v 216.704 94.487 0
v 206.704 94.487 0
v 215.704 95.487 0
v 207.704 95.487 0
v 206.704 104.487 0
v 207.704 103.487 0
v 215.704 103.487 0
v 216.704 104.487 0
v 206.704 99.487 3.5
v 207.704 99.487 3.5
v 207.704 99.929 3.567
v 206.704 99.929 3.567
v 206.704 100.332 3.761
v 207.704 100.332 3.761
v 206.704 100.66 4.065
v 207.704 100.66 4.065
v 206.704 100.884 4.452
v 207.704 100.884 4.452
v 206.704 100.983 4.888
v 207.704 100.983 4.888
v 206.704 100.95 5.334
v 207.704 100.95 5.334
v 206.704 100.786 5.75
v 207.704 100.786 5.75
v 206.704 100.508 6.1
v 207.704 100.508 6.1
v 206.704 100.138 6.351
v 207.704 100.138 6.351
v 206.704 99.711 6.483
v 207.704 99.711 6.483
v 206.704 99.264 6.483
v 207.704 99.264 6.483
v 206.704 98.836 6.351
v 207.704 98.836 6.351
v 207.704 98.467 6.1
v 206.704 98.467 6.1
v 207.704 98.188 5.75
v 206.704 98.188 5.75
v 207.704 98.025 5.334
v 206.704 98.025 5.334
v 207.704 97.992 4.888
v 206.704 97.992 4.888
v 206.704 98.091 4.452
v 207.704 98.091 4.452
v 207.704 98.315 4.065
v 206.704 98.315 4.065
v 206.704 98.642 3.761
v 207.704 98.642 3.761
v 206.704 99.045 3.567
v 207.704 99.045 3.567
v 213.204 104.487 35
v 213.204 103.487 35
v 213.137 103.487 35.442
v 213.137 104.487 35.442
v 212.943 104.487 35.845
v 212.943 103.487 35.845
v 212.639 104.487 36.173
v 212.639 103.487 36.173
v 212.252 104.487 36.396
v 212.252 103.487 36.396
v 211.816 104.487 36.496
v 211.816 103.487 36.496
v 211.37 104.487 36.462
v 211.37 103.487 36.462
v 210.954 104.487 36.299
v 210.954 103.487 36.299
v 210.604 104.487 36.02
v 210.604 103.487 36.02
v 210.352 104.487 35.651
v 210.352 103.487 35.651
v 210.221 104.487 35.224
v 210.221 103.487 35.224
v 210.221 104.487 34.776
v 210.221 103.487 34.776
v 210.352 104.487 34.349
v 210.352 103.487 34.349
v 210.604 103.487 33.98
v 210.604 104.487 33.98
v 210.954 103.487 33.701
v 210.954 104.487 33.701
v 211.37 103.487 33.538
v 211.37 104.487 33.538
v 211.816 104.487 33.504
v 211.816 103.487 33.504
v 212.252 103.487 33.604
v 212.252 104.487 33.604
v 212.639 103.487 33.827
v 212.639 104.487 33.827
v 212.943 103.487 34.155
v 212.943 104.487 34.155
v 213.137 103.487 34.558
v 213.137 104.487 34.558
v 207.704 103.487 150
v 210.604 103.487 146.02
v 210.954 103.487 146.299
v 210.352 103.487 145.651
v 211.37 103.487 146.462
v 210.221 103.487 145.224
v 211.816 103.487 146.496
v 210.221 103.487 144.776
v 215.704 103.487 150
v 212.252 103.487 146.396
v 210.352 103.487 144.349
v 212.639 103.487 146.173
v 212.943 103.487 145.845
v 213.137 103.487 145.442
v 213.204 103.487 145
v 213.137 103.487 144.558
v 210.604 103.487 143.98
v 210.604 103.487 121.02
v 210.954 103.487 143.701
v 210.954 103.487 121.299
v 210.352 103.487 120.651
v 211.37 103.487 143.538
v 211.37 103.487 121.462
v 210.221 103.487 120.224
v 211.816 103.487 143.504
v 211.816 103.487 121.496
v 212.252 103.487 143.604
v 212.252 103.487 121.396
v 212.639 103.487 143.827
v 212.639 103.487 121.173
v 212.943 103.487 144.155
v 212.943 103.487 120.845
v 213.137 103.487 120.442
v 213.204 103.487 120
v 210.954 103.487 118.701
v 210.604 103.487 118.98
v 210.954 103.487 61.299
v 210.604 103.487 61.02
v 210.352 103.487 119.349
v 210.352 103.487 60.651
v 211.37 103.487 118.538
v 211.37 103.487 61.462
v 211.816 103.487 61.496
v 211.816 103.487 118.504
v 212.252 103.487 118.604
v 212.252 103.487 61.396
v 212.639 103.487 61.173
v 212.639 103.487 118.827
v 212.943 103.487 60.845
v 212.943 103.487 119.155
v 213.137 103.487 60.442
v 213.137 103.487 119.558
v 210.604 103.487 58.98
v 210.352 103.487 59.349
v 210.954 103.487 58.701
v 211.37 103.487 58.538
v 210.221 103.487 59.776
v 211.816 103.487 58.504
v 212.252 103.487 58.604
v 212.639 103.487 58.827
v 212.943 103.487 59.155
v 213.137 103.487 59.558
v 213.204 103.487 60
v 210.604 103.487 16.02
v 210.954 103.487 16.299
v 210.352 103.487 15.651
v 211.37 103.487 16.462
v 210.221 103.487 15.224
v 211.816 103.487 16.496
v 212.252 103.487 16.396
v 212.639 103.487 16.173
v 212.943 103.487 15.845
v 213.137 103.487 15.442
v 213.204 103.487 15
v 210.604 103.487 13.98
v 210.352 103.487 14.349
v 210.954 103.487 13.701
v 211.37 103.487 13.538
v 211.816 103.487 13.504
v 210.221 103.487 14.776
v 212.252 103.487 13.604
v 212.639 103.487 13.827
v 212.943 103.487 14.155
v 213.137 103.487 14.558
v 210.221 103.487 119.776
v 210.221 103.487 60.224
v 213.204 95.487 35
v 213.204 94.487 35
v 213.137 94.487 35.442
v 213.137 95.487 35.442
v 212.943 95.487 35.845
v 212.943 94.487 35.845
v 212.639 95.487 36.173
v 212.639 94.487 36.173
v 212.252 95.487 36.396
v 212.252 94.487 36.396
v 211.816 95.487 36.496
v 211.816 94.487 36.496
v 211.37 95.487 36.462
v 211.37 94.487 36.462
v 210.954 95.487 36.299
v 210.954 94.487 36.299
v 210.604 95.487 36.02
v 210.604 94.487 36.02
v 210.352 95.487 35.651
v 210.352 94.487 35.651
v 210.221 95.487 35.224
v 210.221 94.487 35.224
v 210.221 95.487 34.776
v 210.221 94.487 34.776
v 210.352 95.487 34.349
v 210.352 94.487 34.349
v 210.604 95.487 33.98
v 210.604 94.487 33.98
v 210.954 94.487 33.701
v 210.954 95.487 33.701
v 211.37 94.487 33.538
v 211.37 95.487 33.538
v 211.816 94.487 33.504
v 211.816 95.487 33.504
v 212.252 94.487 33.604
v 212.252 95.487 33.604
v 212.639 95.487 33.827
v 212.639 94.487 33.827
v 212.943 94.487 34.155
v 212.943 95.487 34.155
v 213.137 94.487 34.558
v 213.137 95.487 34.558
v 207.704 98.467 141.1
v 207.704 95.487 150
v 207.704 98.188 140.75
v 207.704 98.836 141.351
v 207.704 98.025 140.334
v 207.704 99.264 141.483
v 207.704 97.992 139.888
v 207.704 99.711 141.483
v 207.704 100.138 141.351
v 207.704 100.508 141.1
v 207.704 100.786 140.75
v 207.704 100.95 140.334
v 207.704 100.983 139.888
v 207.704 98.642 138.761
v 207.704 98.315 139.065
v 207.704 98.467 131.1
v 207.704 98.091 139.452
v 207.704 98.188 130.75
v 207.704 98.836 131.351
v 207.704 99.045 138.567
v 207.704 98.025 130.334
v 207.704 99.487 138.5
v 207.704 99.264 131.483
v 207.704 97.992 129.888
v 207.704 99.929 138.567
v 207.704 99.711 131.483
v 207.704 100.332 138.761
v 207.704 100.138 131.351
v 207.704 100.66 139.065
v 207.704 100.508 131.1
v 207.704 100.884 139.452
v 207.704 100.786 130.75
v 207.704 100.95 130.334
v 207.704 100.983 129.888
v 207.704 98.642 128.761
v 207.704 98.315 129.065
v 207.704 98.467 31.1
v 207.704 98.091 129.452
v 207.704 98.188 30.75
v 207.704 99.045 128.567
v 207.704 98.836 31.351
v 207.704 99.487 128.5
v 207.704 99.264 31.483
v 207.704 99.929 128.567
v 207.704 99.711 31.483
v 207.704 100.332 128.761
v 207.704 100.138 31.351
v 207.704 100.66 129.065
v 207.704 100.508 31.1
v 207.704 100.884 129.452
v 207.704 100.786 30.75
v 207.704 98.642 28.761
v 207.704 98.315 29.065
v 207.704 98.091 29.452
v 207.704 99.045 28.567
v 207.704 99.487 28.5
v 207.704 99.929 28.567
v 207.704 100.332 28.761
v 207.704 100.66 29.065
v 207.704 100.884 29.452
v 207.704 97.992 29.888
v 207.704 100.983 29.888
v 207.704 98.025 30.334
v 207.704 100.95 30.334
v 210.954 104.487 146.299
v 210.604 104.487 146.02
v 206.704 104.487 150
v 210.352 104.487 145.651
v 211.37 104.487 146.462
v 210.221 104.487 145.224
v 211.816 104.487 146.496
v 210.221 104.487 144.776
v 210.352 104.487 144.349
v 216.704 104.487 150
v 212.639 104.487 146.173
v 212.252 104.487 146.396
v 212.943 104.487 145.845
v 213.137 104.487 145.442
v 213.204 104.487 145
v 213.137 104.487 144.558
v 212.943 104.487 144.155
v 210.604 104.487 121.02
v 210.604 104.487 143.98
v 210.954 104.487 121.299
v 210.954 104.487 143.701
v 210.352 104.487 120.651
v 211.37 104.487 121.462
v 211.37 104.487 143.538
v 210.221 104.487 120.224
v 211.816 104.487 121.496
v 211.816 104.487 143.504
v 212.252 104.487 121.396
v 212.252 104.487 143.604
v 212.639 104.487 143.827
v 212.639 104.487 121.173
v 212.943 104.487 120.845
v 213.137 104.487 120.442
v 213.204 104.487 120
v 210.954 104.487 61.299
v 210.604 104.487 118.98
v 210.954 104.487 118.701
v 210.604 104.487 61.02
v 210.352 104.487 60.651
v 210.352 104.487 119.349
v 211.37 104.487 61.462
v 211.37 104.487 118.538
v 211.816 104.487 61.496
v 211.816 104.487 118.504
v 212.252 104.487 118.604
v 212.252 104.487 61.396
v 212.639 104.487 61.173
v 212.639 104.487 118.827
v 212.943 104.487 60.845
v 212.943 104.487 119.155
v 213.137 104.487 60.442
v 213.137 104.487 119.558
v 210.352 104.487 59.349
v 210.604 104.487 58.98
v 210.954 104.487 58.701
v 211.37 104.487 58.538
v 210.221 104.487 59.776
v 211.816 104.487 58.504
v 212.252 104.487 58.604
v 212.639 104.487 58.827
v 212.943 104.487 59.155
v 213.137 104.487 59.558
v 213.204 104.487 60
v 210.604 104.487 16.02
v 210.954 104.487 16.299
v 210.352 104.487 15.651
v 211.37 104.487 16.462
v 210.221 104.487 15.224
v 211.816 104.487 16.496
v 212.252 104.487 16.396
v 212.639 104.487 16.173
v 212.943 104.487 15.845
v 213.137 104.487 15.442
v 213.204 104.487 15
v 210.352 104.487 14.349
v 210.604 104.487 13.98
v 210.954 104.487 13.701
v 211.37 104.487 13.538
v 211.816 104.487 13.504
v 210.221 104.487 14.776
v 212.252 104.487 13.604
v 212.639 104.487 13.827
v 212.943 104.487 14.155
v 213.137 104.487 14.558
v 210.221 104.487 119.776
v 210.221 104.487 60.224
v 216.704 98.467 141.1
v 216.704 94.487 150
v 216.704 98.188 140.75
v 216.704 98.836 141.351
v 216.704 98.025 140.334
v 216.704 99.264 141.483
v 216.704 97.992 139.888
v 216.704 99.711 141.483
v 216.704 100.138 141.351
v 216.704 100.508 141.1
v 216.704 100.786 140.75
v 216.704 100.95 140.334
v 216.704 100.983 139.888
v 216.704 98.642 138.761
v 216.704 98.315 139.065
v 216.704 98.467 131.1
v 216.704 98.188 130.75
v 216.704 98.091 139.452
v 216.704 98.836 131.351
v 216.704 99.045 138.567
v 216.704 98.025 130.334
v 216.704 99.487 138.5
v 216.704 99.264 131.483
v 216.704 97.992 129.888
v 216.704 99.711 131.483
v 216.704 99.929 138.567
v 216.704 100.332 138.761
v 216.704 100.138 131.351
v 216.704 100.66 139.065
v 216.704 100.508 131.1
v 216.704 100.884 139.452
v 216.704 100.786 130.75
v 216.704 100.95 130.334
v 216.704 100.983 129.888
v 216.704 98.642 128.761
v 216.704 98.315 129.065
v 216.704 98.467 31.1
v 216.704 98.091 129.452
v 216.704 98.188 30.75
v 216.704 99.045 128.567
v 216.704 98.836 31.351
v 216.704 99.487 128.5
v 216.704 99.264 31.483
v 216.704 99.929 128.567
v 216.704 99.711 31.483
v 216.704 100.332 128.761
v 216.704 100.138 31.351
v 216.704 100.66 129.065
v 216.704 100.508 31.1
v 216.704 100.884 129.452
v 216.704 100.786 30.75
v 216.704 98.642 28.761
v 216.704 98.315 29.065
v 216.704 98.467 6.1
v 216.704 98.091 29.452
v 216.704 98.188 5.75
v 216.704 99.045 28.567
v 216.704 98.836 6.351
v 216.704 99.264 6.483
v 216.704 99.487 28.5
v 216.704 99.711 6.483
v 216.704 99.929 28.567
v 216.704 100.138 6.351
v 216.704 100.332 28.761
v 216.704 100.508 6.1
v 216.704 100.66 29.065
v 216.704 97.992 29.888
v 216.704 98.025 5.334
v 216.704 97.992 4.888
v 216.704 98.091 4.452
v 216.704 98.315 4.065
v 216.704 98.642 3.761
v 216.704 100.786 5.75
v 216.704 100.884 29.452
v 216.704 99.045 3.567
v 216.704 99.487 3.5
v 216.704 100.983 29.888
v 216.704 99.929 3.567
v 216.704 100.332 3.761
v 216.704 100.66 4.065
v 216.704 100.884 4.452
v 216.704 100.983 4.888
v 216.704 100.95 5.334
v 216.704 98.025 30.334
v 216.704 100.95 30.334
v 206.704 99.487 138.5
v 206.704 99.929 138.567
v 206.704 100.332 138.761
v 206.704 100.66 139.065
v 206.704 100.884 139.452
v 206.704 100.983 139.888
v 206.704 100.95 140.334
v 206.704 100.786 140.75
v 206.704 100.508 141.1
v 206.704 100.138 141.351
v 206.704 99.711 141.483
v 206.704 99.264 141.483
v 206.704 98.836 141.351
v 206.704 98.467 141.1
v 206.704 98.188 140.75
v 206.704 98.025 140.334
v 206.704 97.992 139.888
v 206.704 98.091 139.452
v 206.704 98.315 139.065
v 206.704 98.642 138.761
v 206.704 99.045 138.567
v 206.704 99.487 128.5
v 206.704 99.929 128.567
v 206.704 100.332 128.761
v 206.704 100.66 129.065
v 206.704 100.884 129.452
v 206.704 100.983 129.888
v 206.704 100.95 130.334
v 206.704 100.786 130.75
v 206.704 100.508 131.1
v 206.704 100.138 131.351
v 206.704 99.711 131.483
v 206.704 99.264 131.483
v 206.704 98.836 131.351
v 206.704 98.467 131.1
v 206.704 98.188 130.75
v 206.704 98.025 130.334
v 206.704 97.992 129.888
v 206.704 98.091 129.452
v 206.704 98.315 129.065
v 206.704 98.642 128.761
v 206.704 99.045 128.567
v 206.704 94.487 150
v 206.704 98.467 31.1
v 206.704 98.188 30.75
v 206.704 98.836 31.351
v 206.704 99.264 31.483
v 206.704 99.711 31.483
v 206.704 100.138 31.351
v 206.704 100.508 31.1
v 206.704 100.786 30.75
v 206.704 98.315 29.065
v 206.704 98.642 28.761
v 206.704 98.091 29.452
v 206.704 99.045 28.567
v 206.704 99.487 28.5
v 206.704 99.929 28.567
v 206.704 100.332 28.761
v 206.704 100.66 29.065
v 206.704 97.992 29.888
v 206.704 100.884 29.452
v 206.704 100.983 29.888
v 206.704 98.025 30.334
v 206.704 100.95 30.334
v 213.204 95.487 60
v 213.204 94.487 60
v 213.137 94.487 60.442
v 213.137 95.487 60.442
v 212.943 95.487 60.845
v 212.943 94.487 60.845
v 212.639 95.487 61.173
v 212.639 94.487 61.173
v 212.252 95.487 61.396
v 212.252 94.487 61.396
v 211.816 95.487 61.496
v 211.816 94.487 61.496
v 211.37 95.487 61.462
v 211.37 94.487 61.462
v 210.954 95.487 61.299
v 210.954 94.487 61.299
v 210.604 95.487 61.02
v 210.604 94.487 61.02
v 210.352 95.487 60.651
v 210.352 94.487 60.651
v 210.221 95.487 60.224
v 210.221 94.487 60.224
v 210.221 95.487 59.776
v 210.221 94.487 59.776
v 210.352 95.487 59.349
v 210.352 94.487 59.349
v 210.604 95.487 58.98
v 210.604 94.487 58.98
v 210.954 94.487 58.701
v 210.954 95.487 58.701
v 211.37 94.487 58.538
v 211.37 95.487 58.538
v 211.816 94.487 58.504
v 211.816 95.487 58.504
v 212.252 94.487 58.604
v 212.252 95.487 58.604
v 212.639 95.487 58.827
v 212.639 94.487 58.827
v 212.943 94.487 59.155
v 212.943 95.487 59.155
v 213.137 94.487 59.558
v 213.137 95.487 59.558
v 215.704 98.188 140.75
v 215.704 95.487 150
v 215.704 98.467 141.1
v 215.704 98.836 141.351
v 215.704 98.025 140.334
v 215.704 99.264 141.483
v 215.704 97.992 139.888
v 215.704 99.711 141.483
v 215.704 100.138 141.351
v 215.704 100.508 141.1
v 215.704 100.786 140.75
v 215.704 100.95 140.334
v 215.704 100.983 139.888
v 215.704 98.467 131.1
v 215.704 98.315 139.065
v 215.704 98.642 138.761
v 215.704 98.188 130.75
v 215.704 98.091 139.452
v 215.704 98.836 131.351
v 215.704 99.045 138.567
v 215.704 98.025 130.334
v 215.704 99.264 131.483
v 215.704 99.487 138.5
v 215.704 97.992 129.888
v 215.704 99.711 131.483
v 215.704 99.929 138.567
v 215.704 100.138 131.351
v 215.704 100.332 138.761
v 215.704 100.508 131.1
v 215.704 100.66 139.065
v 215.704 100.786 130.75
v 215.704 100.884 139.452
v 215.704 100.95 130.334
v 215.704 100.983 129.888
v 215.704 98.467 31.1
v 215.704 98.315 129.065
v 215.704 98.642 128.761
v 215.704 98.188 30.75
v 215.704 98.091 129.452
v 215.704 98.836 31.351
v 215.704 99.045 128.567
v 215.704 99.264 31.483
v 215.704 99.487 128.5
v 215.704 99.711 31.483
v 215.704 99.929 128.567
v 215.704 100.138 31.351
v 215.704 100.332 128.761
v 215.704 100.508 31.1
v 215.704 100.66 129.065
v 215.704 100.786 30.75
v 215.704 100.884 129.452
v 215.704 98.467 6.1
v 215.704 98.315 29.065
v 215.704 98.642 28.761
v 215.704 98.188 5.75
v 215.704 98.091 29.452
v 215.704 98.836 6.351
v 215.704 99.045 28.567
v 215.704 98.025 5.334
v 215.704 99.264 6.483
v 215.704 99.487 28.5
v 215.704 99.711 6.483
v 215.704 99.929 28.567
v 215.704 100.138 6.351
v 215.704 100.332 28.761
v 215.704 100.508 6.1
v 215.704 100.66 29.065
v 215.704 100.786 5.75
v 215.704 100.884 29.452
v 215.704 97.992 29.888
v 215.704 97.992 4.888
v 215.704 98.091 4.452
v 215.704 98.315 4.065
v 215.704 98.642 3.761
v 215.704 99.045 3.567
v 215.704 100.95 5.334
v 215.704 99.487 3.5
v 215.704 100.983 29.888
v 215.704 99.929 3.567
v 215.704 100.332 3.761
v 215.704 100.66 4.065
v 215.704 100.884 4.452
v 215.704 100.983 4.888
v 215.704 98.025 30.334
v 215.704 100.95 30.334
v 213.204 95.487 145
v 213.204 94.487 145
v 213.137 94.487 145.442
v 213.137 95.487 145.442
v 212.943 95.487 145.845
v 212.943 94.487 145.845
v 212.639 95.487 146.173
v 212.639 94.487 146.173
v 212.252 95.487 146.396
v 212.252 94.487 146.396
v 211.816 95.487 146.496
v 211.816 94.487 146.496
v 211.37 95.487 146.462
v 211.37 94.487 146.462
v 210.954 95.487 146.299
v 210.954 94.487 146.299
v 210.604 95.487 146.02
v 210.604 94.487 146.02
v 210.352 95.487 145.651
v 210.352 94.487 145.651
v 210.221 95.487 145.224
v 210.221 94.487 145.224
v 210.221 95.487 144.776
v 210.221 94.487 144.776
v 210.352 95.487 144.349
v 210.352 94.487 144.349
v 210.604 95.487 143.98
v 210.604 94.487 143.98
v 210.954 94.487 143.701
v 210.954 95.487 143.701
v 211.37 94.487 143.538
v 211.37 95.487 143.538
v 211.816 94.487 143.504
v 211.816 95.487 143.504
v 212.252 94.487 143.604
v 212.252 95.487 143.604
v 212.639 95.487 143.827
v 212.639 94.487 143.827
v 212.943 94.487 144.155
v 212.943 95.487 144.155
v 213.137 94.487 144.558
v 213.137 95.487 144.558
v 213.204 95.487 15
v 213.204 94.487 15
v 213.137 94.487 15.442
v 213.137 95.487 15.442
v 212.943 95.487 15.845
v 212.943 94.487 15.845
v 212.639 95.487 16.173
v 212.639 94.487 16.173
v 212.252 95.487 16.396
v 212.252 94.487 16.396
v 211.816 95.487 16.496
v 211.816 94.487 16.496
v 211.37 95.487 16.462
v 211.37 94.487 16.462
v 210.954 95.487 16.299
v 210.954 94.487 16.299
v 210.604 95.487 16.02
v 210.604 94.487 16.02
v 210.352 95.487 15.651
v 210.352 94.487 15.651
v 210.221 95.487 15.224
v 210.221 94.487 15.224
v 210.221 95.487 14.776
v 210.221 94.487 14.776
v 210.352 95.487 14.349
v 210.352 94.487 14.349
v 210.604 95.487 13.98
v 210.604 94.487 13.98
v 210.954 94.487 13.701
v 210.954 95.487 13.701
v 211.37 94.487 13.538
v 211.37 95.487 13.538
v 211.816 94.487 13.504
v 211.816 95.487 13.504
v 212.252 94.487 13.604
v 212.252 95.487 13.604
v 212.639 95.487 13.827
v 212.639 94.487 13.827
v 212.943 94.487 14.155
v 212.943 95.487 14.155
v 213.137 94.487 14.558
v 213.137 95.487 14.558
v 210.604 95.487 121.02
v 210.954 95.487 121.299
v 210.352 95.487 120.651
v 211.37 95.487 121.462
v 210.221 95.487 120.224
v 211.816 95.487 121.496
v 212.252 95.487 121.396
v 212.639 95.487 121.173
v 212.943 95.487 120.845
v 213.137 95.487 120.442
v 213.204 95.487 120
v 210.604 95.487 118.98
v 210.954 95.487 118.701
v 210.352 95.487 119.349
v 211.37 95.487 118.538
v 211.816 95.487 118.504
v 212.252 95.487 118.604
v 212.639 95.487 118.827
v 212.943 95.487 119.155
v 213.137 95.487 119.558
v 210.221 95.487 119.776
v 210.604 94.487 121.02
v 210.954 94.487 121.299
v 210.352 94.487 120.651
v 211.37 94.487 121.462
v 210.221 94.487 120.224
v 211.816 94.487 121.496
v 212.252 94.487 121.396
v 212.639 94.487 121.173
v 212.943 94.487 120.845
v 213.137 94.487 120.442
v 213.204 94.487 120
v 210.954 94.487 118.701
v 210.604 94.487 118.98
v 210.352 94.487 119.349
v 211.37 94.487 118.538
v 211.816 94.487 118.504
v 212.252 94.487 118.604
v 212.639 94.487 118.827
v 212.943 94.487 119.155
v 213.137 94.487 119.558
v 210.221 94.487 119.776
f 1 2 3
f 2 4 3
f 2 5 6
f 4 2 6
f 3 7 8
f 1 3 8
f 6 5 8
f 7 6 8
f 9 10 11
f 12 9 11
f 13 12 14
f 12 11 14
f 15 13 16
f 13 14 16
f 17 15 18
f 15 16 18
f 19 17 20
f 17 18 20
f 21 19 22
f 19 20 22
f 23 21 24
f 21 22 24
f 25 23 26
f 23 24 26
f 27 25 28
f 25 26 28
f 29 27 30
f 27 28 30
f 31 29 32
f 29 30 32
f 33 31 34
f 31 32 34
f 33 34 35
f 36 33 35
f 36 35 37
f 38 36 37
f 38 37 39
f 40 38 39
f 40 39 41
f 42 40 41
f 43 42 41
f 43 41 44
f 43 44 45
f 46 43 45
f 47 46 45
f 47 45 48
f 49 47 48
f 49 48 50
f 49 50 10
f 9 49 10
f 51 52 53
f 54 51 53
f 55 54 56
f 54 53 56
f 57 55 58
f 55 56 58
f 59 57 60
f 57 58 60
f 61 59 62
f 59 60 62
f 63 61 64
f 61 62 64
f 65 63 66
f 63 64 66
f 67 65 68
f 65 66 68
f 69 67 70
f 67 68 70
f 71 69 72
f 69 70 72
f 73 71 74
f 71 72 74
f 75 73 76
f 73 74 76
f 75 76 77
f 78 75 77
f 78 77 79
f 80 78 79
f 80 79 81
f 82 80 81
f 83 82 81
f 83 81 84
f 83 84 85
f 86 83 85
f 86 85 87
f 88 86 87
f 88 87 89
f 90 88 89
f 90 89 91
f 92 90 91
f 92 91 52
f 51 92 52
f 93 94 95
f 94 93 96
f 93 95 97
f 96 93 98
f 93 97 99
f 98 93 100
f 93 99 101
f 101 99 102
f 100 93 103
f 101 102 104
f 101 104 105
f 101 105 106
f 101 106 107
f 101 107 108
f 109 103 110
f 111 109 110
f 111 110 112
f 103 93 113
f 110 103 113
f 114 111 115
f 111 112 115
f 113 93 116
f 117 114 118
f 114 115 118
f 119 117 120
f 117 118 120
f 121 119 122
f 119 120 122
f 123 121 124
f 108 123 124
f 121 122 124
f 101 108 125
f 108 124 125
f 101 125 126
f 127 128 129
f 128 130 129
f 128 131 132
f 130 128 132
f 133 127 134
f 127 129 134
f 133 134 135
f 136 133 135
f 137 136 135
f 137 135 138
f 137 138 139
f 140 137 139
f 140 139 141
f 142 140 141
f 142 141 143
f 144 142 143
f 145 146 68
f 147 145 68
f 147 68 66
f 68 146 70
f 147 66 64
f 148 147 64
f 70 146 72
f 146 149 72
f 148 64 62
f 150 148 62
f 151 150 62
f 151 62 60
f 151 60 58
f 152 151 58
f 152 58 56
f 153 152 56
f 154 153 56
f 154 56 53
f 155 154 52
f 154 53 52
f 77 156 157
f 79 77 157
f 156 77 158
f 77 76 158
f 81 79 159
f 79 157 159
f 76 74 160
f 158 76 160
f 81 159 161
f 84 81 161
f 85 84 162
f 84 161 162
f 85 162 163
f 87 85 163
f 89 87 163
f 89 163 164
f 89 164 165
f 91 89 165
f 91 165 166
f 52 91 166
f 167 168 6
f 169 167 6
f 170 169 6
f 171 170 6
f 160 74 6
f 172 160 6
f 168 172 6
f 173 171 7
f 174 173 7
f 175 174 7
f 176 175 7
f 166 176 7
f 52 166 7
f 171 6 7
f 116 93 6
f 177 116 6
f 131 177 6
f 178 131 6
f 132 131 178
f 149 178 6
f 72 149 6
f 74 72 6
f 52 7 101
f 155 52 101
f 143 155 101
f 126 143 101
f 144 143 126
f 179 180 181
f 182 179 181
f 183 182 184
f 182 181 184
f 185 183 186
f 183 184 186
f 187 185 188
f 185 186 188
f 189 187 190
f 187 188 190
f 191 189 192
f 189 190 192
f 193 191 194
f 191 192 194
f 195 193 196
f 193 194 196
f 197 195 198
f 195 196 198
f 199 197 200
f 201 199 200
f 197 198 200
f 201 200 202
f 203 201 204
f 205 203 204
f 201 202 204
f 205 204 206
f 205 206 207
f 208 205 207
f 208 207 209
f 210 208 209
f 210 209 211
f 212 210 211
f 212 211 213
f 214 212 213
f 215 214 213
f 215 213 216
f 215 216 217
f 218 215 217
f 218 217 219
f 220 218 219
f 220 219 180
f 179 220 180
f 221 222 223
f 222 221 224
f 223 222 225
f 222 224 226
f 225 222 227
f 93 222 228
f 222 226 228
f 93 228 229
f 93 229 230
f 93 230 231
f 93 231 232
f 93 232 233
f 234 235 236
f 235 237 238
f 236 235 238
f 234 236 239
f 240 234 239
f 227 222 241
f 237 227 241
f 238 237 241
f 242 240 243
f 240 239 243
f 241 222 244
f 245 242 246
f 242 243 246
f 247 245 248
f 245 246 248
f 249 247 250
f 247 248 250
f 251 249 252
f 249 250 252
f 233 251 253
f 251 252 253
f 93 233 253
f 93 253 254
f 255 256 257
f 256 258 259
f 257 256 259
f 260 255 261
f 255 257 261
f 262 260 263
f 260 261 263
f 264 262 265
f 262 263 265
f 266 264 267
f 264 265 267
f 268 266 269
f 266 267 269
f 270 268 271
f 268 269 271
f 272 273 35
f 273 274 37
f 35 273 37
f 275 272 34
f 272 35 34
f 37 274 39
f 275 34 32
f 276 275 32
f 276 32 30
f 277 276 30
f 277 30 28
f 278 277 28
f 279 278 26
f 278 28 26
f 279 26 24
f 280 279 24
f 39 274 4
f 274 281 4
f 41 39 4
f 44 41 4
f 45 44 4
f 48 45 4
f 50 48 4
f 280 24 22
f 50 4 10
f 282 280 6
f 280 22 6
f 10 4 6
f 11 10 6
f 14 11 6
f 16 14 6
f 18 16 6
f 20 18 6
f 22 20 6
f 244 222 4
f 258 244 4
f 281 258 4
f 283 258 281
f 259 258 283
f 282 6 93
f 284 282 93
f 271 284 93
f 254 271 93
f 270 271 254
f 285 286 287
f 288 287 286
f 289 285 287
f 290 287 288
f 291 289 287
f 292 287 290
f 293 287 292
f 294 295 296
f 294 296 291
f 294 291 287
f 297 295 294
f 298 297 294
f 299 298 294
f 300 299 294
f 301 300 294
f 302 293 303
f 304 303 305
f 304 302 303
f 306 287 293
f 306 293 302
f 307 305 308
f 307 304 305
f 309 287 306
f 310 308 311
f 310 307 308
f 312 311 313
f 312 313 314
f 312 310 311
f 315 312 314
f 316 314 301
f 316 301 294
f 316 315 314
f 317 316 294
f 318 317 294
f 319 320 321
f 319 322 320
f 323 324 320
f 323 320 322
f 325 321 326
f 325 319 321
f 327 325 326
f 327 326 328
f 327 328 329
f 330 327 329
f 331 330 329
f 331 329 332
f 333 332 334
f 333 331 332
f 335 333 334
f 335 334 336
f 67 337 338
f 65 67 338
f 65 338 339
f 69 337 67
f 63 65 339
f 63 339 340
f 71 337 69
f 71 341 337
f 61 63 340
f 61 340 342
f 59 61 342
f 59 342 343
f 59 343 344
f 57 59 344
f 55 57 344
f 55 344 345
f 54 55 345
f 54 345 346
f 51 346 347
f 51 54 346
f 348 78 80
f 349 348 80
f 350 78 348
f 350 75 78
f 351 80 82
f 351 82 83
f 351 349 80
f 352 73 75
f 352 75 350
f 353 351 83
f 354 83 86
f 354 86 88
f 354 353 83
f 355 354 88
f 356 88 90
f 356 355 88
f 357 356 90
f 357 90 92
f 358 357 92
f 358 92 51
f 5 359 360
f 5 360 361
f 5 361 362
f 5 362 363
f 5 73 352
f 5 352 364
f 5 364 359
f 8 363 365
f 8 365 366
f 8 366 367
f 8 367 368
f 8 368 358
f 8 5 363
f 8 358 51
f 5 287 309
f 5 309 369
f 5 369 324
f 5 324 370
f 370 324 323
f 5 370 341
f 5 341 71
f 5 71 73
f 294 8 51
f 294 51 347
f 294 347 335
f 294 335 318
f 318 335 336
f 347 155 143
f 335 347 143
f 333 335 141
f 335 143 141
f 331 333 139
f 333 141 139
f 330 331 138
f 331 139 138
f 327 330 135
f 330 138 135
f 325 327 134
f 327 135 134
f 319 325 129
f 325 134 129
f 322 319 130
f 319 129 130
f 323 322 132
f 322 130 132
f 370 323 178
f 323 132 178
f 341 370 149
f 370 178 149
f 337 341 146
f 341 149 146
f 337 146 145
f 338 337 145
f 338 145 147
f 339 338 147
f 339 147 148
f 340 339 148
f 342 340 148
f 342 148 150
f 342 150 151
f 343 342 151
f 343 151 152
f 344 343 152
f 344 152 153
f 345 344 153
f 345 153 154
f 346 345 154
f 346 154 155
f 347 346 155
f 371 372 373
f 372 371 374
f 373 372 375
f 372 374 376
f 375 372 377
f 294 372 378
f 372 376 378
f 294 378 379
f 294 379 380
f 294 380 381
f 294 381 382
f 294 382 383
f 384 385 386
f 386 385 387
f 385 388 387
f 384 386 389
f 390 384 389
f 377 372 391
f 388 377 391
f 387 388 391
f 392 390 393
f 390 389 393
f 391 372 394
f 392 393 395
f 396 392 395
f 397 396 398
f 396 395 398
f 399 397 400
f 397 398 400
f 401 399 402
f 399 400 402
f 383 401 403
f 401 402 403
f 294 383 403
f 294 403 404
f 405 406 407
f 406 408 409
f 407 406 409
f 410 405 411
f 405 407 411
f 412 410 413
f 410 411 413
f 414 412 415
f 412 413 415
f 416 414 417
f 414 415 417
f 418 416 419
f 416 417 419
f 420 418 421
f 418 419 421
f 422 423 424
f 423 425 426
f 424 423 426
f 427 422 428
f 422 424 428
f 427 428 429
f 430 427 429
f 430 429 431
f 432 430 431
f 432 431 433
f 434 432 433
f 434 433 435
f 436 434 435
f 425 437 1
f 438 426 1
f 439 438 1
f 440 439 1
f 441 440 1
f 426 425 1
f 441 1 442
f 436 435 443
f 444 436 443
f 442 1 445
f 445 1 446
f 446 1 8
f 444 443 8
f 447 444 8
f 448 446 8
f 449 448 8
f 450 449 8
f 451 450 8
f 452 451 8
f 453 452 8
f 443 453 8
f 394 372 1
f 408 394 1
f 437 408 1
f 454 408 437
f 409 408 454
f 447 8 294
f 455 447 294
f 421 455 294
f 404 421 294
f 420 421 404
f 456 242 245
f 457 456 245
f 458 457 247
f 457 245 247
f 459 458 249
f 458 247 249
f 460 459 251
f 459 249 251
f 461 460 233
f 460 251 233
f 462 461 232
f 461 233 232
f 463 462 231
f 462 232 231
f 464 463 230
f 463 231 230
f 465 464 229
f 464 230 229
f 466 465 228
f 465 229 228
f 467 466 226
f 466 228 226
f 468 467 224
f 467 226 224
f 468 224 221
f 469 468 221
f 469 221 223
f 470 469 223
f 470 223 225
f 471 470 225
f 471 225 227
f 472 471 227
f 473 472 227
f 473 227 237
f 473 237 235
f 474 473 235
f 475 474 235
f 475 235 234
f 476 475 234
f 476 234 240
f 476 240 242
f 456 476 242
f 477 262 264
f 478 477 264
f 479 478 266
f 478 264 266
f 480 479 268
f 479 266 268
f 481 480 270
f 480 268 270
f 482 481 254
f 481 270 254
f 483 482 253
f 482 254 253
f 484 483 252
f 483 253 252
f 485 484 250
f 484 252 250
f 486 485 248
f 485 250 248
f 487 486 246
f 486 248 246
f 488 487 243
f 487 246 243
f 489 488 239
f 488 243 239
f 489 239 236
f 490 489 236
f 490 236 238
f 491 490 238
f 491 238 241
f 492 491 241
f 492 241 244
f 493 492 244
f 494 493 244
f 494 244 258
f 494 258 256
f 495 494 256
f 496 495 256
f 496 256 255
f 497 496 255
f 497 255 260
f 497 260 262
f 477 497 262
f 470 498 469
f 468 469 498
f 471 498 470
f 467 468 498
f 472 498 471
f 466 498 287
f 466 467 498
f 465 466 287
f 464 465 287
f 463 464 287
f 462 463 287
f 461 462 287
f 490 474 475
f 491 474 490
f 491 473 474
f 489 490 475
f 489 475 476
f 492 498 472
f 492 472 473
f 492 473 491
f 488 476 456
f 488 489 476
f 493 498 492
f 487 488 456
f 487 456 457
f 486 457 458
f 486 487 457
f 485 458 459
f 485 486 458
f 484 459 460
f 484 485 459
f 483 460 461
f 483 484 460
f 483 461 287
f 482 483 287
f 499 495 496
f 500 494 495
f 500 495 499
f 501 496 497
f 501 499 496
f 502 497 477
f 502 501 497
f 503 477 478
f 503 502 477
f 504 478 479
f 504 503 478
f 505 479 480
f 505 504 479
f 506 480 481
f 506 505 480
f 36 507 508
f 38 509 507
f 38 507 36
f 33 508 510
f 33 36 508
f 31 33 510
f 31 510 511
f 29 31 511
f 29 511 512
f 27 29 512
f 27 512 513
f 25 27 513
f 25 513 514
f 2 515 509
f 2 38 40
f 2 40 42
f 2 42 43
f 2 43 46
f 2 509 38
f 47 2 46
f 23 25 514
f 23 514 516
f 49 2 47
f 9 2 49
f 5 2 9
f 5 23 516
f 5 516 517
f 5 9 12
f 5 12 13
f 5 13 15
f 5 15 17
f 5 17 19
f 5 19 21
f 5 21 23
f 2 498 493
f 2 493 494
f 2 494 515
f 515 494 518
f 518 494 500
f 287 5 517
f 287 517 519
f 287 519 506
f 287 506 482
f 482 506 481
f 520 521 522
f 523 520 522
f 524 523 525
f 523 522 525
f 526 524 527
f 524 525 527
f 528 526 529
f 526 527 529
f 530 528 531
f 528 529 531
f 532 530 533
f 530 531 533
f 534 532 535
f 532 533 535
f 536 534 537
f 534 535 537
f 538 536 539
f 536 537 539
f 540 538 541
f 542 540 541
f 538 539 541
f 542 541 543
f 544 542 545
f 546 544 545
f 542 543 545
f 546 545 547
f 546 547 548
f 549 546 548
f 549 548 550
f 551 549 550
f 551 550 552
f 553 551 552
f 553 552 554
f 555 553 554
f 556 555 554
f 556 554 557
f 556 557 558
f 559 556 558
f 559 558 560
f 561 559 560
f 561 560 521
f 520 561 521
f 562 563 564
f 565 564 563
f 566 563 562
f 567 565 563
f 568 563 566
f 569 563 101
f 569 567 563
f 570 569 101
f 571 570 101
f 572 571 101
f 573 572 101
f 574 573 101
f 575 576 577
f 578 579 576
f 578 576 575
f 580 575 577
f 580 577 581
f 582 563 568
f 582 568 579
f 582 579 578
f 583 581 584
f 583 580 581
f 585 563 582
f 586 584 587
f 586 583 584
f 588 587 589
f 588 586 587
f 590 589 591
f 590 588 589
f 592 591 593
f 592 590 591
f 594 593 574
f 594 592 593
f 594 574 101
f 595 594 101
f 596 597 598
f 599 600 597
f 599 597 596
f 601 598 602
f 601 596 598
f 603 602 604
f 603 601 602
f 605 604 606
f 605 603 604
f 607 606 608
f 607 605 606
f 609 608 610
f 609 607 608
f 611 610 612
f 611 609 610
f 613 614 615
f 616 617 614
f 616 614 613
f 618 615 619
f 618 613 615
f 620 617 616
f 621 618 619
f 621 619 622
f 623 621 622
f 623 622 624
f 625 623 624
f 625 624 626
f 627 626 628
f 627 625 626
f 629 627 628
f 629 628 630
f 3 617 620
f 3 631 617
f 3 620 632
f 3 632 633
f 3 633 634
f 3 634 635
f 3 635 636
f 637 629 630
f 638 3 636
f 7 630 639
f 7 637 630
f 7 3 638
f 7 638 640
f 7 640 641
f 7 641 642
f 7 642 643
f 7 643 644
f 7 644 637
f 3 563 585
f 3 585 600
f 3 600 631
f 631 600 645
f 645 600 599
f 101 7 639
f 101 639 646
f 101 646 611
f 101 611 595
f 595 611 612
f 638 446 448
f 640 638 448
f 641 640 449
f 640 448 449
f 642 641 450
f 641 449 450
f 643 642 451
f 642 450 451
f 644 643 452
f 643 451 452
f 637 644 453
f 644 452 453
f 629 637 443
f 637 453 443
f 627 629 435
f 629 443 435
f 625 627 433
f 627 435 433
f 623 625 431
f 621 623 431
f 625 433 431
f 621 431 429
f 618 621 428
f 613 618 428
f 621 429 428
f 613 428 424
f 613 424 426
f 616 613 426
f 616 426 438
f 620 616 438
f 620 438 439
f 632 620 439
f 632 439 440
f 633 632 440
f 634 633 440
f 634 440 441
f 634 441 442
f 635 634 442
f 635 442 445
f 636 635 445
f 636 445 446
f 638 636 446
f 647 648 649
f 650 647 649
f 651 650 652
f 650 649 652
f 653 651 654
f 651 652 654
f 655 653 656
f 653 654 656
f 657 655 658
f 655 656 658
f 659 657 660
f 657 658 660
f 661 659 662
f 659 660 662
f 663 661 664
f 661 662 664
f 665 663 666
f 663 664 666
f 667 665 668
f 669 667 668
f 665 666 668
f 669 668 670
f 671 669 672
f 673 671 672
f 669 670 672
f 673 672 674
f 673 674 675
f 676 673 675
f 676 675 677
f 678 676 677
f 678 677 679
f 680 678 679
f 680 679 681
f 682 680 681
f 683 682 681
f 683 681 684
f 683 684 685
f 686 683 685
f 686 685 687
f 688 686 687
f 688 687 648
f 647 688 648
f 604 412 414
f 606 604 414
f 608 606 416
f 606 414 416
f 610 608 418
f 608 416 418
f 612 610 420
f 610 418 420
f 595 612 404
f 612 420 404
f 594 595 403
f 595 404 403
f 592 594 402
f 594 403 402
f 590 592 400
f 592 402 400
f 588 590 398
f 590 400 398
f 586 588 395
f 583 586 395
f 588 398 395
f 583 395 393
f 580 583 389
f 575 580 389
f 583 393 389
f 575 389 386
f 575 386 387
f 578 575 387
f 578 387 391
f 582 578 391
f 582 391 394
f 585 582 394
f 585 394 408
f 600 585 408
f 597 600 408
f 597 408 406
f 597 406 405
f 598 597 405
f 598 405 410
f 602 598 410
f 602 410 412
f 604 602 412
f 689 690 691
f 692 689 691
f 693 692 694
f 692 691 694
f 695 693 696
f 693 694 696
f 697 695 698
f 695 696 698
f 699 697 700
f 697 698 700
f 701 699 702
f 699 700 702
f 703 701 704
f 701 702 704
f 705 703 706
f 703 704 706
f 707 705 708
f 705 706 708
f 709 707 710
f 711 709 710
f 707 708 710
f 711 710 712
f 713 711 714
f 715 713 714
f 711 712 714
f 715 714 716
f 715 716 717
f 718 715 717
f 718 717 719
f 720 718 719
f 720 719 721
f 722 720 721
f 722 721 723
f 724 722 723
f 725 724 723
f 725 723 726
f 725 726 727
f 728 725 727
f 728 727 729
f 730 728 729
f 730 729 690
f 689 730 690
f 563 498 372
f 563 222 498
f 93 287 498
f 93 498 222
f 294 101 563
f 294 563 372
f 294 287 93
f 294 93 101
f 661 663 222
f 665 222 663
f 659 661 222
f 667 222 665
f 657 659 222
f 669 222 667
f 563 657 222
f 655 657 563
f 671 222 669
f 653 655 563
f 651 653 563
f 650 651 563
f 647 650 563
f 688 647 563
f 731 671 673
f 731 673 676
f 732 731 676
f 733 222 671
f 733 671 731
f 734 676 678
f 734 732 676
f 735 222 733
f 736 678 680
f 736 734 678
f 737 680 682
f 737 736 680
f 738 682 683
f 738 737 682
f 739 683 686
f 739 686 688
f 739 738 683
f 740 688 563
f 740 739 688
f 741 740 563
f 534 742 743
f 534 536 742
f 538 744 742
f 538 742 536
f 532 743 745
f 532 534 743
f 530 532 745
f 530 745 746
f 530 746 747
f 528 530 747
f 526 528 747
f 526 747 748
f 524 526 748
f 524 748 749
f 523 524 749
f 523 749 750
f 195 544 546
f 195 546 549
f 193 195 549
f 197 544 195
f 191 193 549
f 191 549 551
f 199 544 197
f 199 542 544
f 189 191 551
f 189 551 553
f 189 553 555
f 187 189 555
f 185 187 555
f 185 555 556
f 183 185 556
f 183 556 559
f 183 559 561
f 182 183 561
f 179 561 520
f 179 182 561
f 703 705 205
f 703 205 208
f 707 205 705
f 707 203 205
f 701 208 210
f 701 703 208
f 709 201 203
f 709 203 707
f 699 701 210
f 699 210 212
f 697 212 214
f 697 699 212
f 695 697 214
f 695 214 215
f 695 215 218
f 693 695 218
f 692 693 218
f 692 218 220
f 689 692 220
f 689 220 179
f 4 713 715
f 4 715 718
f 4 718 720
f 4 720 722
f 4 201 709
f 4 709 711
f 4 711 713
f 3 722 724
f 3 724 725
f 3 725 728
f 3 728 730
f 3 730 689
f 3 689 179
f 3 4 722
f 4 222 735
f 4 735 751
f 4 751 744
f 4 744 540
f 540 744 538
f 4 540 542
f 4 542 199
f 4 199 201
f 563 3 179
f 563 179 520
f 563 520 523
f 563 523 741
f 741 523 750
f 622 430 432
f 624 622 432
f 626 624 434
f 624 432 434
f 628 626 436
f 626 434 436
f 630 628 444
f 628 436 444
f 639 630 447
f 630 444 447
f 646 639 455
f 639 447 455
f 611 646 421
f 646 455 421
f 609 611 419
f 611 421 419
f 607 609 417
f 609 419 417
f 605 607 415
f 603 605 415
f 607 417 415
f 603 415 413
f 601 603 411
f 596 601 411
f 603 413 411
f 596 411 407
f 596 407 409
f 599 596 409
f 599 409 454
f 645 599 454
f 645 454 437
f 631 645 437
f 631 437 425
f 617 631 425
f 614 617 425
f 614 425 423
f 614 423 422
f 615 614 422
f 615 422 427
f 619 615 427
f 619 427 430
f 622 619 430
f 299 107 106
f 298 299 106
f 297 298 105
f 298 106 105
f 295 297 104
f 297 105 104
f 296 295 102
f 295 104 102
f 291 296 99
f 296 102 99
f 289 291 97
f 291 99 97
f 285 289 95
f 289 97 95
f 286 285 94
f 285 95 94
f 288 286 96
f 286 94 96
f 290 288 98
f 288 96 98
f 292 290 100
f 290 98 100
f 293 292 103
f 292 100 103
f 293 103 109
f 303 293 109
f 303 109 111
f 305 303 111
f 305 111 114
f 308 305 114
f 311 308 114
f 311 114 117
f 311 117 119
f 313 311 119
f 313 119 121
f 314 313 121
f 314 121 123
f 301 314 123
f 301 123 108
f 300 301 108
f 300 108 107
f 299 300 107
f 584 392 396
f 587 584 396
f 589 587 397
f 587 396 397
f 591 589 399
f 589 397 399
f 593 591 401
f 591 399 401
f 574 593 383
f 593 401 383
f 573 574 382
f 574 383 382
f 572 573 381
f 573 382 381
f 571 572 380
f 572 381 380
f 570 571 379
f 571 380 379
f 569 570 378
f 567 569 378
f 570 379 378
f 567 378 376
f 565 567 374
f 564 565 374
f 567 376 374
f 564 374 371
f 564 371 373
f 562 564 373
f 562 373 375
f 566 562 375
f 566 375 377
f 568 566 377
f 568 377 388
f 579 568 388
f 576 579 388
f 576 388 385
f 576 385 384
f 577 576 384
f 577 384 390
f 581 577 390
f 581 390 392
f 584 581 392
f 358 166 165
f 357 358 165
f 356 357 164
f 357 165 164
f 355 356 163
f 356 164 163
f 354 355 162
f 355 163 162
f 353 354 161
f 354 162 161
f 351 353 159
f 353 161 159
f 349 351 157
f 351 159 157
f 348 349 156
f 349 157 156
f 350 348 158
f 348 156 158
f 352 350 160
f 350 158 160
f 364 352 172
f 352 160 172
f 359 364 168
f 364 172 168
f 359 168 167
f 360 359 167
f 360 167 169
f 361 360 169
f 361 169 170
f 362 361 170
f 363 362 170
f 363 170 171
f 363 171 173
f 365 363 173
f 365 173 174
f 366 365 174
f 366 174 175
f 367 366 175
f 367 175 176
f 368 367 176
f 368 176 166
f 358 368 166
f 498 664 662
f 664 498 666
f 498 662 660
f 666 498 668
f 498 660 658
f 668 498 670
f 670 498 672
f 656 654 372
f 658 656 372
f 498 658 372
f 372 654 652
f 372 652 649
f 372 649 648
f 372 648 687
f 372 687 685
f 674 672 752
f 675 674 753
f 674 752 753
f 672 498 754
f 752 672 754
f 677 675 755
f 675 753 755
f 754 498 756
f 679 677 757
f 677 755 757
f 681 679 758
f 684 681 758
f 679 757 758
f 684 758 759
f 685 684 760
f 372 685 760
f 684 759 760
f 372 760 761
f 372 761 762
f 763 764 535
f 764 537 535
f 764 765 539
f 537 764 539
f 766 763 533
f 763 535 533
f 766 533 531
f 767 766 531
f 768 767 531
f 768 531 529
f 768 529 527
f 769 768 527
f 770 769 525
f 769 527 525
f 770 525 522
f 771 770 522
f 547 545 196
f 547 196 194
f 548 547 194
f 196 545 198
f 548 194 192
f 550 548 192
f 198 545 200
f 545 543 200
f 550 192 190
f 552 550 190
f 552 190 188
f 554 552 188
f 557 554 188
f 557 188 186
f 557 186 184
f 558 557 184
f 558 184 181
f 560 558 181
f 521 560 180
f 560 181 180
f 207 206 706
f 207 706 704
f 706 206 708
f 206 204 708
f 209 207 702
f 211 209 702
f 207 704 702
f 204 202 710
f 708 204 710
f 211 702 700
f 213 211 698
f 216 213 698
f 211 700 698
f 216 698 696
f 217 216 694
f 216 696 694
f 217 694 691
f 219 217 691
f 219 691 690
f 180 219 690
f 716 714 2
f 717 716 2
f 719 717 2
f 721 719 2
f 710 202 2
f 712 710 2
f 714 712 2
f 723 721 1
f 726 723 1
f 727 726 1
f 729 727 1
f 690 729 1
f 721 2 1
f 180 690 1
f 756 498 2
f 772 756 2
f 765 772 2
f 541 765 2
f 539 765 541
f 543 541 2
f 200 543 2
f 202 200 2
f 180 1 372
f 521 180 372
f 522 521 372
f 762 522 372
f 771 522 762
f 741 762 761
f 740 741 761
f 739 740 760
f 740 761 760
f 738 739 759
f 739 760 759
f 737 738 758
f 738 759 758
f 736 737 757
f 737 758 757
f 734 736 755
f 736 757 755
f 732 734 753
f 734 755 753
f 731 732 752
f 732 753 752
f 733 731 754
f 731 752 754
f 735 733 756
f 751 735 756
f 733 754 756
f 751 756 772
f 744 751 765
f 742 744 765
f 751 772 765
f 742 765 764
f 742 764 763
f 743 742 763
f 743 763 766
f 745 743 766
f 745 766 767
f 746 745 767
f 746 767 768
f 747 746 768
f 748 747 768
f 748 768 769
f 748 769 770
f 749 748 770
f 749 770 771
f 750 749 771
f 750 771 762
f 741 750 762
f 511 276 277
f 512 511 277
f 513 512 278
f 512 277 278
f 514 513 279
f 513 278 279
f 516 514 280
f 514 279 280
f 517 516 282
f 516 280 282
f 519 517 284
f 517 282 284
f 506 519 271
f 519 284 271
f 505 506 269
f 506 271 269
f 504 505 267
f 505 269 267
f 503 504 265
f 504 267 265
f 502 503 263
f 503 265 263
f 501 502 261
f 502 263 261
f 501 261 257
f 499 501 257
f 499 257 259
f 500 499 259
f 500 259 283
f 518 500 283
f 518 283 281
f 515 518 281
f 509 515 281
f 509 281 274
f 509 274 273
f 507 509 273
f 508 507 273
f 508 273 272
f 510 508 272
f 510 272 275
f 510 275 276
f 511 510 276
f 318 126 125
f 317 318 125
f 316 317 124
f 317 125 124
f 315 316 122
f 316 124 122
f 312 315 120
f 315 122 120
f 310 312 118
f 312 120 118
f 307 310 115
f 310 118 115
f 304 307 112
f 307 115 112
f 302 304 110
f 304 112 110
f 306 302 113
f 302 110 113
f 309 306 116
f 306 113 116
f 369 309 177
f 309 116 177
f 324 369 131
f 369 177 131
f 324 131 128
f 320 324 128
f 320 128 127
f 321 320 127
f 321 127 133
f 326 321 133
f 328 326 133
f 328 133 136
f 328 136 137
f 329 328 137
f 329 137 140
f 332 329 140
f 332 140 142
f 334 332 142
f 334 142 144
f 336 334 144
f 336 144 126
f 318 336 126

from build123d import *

# Parameters (mm, degrees)
SKETCH_1_W          = 10
SKETCH_1_H          = 10
SKETCH_1_W_2        = 8
SKETCH_1_H_2        = 8
EXTRUDE_1_DEPTH     = 150
SKETCH_2_R          = 1.5
CUT_EXTRUDE_1_DEPTH = 11
SKETCH_3_R          = 1.5
CUT_EXTRUDE_2_DEPTH = 11


with BuildPart() as part:
    # 草图1 → 拉伸-薄壁1 (new body)
    with BuildSketch(Plane.XY):
        with Locations((211.703793946, 99.48732034)):
            Rectangle(SKETCH_1_W, SKETCH_1_H)
        with Locations((211.703793946, 99.48732034)):
            Rectangle(SKETCH_1_W_2, SKETCH_1_H_2, mode=Mode.SUBTRACT)
    extrude(amount=EXTRUDE_1_DEPTH)

    # 草图2 → 切除-拉伸1 (cut, through all)
    with BuildSketch(Plane(origin=(216.703793946, 0, 0), x_dir=(0, 0, -1), z_dir=(1, 0, 0))):
        with Locations((-30, 99.48732034)):
            Circle(SKETCH_2_R)
        with Locations((-5, 99.48732034)):
            Circle(SKETCH_2_R)
        with Locations((-130, 99.48732034)):
            Circle(SKETCH_2_R)
        with Locations((-140, 99.48732034)):
            Circle(SKETCH_2_R)
    extrude(amount=-CUT_EXTRUDE_1_DEPTH, mode=Mode.SUBTRACT)

    # 草图3 → 切除-拉伸2 (cut, through all)
    with BuildSketch(Plane.XZ.offset(-94.48732034)):
        with Locations((211.703793946, 120)):
            Circle(SKETCH_3_R)
        with Locations((211.703793946, 35)):
            Circle(SKETCH_3_R)
        with Locations((211.703793946, 145)):
            Circle(SKETCH_3_R)
        with Locations((211.703793946, 60)):
            Circle(SKETCH_3_R)
        with Locations((211.703793946, 15)):
            Circle(SKETCH_3_R)
    extrude(amount=-CUT_EXTRUDE_2_DEPTH, mode=Mode.SUBTRACT)


solid = part.part
